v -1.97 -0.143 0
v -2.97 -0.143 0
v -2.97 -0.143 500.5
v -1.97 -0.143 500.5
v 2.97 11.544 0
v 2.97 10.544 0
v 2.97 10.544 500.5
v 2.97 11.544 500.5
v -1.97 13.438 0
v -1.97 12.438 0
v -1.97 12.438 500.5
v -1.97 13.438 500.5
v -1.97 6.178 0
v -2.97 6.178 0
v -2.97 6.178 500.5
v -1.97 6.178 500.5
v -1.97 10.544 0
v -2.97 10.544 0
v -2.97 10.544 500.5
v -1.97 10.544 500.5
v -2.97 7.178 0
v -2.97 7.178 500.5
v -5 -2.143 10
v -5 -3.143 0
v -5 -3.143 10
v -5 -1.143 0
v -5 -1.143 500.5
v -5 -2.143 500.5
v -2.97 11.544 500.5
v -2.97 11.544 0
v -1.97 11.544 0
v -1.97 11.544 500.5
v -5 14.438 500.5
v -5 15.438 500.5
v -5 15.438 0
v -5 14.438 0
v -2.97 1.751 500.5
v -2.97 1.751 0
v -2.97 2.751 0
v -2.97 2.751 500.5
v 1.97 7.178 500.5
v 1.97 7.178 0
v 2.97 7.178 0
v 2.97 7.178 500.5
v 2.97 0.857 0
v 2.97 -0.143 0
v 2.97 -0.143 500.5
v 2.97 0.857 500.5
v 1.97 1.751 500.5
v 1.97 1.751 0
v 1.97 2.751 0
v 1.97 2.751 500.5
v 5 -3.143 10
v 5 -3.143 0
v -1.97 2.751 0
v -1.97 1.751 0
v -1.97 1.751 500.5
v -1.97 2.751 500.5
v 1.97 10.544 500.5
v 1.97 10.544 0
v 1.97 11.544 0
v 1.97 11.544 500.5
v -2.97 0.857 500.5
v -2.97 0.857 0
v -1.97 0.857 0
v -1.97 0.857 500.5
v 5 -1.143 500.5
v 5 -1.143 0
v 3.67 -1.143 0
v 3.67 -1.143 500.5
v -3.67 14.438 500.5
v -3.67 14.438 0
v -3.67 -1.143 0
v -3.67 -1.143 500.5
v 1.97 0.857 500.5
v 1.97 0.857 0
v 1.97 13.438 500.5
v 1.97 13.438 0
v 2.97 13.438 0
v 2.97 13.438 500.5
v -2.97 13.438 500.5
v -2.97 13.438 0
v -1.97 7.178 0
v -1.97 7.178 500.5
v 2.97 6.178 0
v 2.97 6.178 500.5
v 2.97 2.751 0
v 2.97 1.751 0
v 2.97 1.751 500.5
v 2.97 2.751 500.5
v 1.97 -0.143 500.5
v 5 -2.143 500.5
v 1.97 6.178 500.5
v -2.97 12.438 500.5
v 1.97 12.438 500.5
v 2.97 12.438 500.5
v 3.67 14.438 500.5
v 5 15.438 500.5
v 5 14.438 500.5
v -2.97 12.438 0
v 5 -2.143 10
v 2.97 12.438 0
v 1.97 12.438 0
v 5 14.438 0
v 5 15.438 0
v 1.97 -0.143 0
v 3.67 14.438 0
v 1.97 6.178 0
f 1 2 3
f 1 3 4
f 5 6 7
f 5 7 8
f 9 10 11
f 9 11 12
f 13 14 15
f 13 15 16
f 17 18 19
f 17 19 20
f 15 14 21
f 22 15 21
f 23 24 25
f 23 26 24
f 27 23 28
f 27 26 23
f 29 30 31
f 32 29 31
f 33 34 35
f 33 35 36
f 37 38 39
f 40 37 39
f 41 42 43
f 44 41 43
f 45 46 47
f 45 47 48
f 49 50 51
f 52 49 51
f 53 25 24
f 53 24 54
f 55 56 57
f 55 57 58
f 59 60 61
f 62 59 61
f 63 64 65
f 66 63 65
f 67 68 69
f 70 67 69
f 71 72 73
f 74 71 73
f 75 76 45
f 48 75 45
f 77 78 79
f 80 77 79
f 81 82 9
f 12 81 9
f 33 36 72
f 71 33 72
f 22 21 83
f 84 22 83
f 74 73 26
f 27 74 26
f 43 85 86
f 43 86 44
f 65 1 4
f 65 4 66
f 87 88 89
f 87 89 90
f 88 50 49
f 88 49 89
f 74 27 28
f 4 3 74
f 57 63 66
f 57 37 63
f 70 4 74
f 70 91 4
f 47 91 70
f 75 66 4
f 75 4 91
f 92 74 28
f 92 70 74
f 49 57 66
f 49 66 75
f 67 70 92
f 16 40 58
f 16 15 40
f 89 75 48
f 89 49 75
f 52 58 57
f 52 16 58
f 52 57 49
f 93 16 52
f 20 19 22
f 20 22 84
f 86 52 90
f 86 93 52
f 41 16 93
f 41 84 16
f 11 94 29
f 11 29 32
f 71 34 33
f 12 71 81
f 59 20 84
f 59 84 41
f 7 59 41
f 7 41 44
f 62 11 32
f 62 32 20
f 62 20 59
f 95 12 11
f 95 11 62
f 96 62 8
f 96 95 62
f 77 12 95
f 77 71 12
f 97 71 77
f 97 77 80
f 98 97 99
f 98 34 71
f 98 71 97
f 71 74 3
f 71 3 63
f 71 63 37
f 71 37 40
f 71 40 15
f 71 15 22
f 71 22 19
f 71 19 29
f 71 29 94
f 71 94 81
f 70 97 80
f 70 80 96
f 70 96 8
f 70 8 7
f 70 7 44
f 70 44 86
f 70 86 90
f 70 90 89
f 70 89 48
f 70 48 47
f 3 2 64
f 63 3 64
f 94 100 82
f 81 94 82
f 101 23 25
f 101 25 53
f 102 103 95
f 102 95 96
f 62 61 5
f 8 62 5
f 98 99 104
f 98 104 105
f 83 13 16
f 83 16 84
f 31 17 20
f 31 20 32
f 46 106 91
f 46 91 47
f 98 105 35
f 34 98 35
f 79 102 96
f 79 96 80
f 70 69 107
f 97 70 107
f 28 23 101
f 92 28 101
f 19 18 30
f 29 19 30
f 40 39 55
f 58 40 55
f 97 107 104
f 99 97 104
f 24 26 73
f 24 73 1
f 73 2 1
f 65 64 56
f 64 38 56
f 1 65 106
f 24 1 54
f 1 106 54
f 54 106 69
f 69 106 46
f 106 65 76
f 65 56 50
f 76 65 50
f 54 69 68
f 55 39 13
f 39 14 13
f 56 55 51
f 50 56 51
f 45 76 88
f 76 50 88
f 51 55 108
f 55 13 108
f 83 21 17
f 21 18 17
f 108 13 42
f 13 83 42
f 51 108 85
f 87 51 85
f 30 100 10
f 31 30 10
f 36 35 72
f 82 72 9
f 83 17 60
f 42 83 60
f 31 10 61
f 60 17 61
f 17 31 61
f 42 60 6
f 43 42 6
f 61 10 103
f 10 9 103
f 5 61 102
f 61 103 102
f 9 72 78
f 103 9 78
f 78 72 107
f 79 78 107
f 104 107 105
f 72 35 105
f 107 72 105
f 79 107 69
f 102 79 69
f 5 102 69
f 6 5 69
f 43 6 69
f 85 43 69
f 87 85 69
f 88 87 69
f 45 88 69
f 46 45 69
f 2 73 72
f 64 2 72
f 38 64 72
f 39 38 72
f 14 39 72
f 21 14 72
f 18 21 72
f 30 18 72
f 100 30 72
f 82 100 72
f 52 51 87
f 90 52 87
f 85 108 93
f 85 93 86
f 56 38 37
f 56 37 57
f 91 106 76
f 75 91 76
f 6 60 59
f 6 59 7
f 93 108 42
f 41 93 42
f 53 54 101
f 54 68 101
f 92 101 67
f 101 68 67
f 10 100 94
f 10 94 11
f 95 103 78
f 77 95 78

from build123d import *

# Parameters (mm, degrees)
F1_DEPTH = 500.5
F2_W     = 10
F2_H     = 10
F3_DEPTH = 1
F4_W     = 1
F4_H     = 1
F5_DEPTH = 505.5


with BuildPart() as f1:
    # F0 (on Top) → F1 (new body)
    with BuildSketch(Plane.XY):
        Polygon((5, 15.438399), (-5, 15.438399), (-5, 14.438399), (-3.67, 14.438399), (-3.67, -1.142601), (-5, -1.142601), (-5, -2.142601), (5, -2.142601), (5, -1.142601), (3.67, -1.142601), (3.67, 14.438399), (5, 14.438399), align=None)
    extrude(amount=F1_DEPTH)

    # F2 (on face) → F3 (join)
    with BuildSketch(Plane.XZ.offset(2.142601)):
        with Locations((0, 5)):
            Rectangle(F2_W, F2_H)
    extrude(amount=F3_DEPTH)

    # F4 (on face) → F5 (cut)
    with BuildSketch(Plane.XY.offset(500.5)):
        with Locations((-2.47, 12.938399)):
            Rectangle(F4_W, F4_H)
        with Locations((-2.47, 0.357399)):
            Rectangle(F4_W, F4_H)
        with Locations((2.47, 12.938399)):
            Rectangle(F4_W, F4_H)
        with Locations((2.47, 0.357399)):
            Rectangle(F4_W, F4_H)
        with Locations((-2.47, 6.678488)):
            Rectangle(F4_W, F4_H)
        with Locations((2.47, 6.678488)):
            Rectangle(F4_W, F4_H)
        with Locations((-2.47, 11.044263)):
            Rectangle(F4_W, F4_H)
        with Locations((2.47, 11.044263)):
            Rectangle(F4_W, F4_H)
        with Locations((-2.47, 2.251399)):
            Rectangle(F4_W, F4_H)
        with Locations((2.47, 2.251399)):
            Rectangle(F4_W, F4_H)
    extrude(amount=-F5_DEPTH, mode=Mode.SUBTRACT)


solid = f1.part
